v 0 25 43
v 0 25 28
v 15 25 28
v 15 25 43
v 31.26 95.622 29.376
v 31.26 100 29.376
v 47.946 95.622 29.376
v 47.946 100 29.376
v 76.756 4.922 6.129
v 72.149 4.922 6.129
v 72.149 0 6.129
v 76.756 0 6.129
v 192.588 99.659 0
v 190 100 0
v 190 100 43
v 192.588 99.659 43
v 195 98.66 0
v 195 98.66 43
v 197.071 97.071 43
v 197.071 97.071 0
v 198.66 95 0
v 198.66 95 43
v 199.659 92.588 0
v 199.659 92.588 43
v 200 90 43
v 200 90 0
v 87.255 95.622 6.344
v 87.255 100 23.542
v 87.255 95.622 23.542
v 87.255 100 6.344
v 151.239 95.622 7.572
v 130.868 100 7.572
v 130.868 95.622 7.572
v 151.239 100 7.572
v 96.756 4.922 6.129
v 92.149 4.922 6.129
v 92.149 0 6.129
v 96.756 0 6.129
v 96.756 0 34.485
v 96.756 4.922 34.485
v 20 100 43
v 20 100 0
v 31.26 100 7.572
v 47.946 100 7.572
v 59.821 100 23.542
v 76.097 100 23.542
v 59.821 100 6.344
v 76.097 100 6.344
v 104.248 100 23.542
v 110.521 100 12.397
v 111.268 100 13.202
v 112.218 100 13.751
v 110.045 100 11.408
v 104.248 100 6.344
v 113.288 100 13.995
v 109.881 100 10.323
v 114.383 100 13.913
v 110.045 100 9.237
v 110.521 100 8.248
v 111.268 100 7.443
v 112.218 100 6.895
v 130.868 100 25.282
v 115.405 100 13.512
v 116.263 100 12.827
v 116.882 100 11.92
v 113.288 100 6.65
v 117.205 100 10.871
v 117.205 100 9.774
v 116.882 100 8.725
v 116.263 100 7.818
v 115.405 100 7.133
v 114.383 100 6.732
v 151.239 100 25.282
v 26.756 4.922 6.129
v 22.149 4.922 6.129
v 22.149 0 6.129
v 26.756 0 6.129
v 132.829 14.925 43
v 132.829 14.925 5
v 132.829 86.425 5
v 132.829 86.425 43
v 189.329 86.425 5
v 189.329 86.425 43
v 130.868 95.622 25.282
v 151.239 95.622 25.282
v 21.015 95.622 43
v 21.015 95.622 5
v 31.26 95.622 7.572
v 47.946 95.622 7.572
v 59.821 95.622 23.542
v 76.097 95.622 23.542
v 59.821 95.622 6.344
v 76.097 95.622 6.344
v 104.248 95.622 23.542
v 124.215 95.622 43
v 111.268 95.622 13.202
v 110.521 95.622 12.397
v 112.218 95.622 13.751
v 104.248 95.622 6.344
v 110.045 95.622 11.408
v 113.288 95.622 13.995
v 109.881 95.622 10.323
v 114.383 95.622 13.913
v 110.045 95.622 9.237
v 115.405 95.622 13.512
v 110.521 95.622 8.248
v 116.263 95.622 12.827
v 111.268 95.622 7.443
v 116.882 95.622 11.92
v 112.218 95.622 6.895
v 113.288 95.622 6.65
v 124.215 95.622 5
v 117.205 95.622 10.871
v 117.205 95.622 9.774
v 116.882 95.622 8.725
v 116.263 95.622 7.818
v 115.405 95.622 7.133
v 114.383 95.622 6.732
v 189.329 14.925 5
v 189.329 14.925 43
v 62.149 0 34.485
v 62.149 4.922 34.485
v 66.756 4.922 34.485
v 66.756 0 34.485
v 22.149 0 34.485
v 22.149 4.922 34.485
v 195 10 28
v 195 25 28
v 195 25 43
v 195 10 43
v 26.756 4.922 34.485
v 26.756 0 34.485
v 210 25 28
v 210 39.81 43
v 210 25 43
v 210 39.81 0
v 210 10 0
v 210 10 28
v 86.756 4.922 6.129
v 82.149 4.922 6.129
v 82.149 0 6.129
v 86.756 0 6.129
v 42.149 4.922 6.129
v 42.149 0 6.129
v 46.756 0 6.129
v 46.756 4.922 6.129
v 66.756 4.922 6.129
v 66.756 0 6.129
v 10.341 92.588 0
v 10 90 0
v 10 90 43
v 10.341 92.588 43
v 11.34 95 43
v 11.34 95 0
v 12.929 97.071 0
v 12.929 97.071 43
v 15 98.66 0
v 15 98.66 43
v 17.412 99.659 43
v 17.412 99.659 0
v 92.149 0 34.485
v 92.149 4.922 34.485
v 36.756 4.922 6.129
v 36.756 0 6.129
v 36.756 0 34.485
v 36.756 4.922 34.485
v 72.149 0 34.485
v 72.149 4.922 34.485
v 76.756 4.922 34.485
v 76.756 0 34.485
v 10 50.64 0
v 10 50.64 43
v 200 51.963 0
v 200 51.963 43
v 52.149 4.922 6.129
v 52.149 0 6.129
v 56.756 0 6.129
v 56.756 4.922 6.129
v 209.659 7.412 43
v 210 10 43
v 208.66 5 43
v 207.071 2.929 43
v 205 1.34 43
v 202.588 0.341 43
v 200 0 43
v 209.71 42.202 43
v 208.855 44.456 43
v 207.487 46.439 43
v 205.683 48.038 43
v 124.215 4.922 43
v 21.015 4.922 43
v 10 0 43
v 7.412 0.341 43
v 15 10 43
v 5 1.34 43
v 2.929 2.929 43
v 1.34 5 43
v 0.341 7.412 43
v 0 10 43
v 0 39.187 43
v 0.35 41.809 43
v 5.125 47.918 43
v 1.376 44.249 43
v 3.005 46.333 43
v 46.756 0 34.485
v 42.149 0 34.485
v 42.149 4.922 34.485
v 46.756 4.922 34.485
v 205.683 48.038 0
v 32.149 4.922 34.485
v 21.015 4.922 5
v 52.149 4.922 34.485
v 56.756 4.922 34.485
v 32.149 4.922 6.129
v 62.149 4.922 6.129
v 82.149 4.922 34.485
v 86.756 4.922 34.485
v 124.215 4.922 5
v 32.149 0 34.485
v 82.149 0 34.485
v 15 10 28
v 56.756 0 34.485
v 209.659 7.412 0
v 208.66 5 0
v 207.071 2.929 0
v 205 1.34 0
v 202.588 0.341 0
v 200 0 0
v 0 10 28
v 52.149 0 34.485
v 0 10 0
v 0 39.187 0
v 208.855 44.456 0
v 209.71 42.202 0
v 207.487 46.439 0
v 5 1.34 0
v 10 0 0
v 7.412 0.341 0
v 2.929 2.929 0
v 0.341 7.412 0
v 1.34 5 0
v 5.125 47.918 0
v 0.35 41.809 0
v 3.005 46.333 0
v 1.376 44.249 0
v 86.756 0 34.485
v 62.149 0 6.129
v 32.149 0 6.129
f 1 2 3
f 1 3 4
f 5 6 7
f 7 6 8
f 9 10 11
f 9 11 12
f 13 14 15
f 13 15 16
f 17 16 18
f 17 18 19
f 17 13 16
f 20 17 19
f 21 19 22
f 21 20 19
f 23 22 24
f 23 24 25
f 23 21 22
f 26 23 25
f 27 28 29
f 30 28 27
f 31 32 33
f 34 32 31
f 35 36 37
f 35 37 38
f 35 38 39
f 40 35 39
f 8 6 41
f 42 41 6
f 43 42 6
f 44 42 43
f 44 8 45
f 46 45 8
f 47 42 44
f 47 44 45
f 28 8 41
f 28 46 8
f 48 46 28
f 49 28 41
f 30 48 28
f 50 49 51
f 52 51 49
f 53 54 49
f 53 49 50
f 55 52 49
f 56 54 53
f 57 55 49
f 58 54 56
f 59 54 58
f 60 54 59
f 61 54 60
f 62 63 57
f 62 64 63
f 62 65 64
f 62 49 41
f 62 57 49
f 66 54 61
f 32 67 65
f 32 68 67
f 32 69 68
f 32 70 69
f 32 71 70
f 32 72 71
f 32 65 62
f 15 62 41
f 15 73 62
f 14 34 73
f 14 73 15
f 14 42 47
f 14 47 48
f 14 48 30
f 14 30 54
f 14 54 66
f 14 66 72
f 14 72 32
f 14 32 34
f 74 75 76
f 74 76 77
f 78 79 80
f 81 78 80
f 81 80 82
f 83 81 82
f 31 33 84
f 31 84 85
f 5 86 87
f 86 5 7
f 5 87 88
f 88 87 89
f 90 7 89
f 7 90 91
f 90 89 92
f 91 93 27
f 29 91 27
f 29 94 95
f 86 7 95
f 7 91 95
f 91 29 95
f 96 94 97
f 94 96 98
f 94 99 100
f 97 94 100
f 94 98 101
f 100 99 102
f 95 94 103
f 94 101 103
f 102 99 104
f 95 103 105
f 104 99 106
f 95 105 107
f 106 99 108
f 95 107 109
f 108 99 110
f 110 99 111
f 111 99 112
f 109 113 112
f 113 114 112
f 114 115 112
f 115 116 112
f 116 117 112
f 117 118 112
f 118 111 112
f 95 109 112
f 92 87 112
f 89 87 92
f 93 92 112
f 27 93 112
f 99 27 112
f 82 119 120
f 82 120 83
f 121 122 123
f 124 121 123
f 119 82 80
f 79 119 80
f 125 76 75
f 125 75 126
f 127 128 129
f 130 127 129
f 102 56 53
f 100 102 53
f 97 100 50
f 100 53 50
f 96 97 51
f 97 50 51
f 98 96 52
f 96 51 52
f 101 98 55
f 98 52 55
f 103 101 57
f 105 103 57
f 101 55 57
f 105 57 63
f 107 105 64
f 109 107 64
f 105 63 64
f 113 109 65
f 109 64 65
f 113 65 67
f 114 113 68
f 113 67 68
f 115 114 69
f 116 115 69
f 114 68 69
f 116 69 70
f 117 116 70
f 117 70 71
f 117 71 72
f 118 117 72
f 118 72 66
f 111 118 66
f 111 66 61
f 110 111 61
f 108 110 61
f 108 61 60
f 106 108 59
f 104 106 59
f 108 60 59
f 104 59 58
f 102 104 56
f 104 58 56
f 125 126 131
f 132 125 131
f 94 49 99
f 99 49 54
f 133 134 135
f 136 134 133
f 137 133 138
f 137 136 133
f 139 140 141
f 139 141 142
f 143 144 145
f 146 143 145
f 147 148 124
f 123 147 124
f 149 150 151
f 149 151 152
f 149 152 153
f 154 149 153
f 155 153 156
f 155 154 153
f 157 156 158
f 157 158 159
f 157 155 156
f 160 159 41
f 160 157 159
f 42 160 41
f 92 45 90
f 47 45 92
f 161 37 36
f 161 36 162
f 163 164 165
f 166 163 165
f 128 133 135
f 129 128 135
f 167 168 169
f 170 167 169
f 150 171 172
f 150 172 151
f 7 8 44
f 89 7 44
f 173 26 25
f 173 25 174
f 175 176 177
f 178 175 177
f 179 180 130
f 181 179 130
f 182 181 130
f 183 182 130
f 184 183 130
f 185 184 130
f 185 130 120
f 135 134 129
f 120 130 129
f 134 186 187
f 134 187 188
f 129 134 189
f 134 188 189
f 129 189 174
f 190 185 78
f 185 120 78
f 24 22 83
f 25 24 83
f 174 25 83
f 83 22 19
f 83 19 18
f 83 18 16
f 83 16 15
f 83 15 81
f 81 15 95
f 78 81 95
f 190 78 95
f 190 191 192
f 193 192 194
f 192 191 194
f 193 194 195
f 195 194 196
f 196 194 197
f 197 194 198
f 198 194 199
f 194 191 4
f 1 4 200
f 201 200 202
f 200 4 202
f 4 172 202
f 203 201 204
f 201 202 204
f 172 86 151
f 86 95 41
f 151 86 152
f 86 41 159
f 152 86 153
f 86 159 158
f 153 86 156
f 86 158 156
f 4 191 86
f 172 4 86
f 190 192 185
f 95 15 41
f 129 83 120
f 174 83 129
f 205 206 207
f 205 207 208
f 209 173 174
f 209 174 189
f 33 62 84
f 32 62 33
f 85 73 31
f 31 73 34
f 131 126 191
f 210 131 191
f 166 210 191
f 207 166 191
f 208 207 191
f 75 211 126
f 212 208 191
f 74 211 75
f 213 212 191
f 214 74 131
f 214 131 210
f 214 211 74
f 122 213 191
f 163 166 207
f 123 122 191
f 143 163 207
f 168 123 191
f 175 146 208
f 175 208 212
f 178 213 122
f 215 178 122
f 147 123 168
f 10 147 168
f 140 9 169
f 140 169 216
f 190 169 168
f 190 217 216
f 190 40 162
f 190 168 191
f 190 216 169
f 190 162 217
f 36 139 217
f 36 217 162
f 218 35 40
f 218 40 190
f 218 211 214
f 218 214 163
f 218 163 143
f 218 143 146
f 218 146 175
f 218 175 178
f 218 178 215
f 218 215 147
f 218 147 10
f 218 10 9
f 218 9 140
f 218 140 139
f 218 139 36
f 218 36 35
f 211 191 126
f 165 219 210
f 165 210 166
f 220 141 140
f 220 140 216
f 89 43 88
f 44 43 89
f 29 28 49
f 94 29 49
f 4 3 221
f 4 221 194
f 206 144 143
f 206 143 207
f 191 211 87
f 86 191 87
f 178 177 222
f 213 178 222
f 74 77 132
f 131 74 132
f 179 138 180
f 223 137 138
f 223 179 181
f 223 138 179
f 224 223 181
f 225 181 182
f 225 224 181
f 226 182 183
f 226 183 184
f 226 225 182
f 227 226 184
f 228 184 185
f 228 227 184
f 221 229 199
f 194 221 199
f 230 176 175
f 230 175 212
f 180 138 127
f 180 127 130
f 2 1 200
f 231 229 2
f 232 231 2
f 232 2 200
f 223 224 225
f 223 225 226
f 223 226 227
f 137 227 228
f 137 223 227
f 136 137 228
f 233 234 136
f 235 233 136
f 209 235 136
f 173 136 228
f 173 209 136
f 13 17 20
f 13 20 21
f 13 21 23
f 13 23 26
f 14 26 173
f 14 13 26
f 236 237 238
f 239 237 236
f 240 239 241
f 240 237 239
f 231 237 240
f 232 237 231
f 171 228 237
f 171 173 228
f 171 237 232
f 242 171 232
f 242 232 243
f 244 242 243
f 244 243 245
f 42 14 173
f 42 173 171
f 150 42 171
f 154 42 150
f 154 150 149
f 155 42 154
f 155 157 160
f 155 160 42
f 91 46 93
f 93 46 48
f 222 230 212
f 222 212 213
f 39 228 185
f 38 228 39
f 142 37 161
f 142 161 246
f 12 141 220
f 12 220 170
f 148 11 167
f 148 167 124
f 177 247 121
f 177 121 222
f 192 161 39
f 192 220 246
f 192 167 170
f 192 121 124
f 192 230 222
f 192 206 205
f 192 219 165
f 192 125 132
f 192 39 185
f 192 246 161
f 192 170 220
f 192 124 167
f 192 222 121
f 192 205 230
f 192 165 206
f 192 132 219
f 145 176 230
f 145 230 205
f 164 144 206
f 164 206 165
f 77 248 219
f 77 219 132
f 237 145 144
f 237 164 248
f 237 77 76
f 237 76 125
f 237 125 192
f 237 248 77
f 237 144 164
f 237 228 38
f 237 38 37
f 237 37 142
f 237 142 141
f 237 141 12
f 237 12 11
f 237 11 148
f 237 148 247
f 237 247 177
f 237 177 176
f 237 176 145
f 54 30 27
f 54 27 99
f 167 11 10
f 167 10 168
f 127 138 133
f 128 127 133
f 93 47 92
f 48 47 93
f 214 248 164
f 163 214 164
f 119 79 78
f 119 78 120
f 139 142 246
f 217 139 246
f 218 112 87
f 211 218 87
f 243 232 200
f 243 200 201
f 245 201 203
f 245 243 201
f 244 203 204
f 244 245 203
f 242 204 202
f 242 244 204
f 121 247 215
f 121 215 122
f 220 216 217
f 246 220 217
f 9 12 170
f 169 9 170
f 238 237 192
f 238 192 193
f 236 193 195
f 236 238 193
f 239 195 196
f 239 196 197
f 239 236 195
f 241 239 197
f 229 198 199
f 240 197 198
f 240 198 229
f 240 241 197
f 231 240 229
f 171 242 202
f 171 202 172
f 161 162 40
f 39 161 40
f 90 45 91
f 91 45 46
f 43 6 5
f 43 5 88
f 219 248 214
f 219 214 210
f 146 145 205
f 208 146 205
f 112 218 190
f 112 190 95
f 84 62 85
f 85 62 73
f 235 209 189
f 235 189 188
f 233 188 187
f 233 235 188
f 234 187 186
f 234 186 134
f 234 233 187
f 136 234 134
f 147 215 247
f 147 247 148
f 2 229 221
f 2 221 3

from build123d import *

# Parameters (mm, degrees)
SKETCH_1_W          = 103.2
SKETCH_1_H          = 90.7
SKETCH_1_W_2        = 56.5
SKETCH_1_H_2        = 71.5
EXTRUDE_1_DEPTH     = 43
EXTRUDE_3_DEPTH     = 5
SKETCH_4_R          = 3.682623049
SKETCH_4_W          = 20.371137154
SKETCH_4_H          = 17.709581546
SKETCH_4_W_2        = 16.685906313
SKETCH_4_H_2        = 21.804282482
SKETCH_4_W_3        = 16.276436219
SKETCH_4_H_3        = 17.19774393
SKETCH_4_W_4        = 16.993008883
CUT_EXTRUDE_2_DEPTH = 4.377522815
SKETCH_5_W          = 4.606538552
SKETCH_5_H          = 28.355803979
CUT_EXTRUDE_3_DEPTH = 4.922477185
SKETCH_8_W          = 15
SKETCH_8_H          = 15
CUT_EXTRUDE_5_DEPTH = 15


with BuildPart() as part:
    # 草图1 → 凸台-拉伸1 (new body)
    with BuildSketch(Plane.XY):
        with BuildLine():
            Line((0, 10), (0, 39.186569494))
            ThreePointArc((0, 39.186569494), (1.375838219, 44.248568464), (5.124766715, 47.917669105))
            Line((5.124766715, 47.917669105), (10, 50.639880584))
            Line((10, 50.639880584), (10, 90))
            ThreePointArc((10, 90), (12.928932188, 97.071067812), (20, 100))
            Line((20, 100), (190, 100))
            ThreePointArc((190, 100), (197.071067812, 97.071067812), (200, 90))
            Line((200, 90), (200, 51.963395008))
            Line((200, 51.963395008), (205.683304945, 48.037782396))
            ThreePointArc((205.683304945, 48.037782396), (208.855310538, 44.455580593), (210, 39.809778695))
            Line((210, 39.809778695), (210, 10))
            ThreePointArc((210, 10), (207.071067812, 2.928932188), (200, 0))
            Line((200, 0), (10, 0))
            ThreePointArc((10, 0), (2.928932188, 2.928932188), (0, 10))
        make_face()
        with Locations((72.614593403, 50.272477185)):
            Rectangle(SKETCH_1_W, SKETCH_1_H, mode=Mode.SUBTRACT)
        with Locations((161.079111209, 50.675353005)):
            Rectangle(SKETCH_1_W_2, SKETCH_1_H_2, mode=Mode.SUBTRACT)
    extrude(amount=EXTRUDE_1_DEPTH)

    # 草图3 → 凸台-拉伸3 (add)
    with BuildSketch(Plane.XY):
        with BuildLine():
            Line((0, 10), (0, 39.186569494))
            ThreePointArc((0, 39.186569494), (1.375838219, 44.248568464), (5.124766715, 47.917669105))
            Line((5.124766715, 47.917669105), (10, 50.639880584))
            Line((10, 50.639880584), (10, 90))
            ThreePointArc((10, 90), (12.928932188, 97.071067812), (20, 100))
            Line((20, 100), (180, 100))
            ThreePointArc((180, 100), (187.071067812, 97.071067812), (190, 90))
            Line((190, 90), (190, 51.963395008))
            Line((190, 51.963395008), (195.683304945, 48.037782396))
            ThreePointArc((195.683304945, 48.037782396), (198.855310538, 44.455580593), (200, 39.809778695))
            Line((200, 39.809778695), (200, 10))
            ThreePointArc((200, 10), (197.071067812, 2.928932188), (190, 0))
            Line((190, 0), (10, 0))
            ThreePointArc((10, 0), (2.928932188, 2.928932188), (0, 10))
        make_face()
    extrude(amount=EXTRUDE_3_DEPTH)

    # 草图4 → 切除-拉伸2 (cut)
    with BuildSketch(Plane(origin=(0, 100, 0), x_dir=(1, 0, 0), z_dir=(0, 1, 0))):
        with Locations(Location((113.563696849, -10.32262821, 0), (0, 0, 180))):
            Circle(SKETCH_4_R)
        with Locations((141.053854619, -16.426982565)):
            Rectangle(SKETCH_4_W, SKETCH_4_H)
        with Locations((39.603161201, -18.474333033)):
            Rectangle(SKETCH_4_W_2, SKETCH_4_H_2)
        with Locations((67.958965179, -14.942653476)):
            Rectangle(SKETCH_4_W_3, SKETCH_4_H_3)
        with Locations((95.751747779, -14.942653476)):
            Rectangle(SKETCH_4_W_4, SKETCH_4_H_3)
    extrude(amount=-CUT_EXTRUDE_2_DEPTH, mode=Mode.SUBTRACT)

    # 草图5 → 切除-拉伸3 (cut)
    with BuildSketch(Plane.XZ):
        with Locations((34.452767739, 20.30710257)):
            Rectangle(SKETCH_5_W, SKETCH_5_H)
        with Locations((24.452767739, 20.30710257)):
            Rectangle(SKETCH_5_W, SKETCH_5_H)
        with Locations((44.452767739, 20.30710257)):
            Rectangle(SKETCH_5_W, SKETCH_5_H)
        with Locations((54.452767739, 20.30710257)):
            Rectangle(SKETCH_5_W, SKETCH_5_H)
        with Locations((64.452767739, 20.30710257)):
            Rectangle(SKETCH_5_W, SKETCH_5_H)
        with Locations((74.452767739, 20.30710257)):
            Rectangle(SKETCH_5_W, SKETCH_5_H)
        with Locations((84.452767739, 20.30710257)):
            Rectangle(SKETCH_5_W, SKETCH_5_H)
        with Locations((94.452767739, 20.30710257)):
            Rectangle(SKETCH_5_W, SKETCH_5_H)
    extrude(amount=-CUT_EXTRUDE_3_DEPTH, mode=Mode.SUBTRACT)

    # 草图8 → 切除-拉伸5 (cut)
    with BuildSketch(Plane.ZY):
        with Locations((35.5, 17.5)):
            Rectangle(SKETCH_8_W, SKETCH_8_H)
    cut_extrude_5 = extrude(amount=-CUT_EXTRUDE_5_DEPTH, mode=Mode.SUBTRACT)

    # 镜向1: 切除-拉伸5 across plane
    add(cut_extrude_5.mirror(Plane.ZY.offset(-105)), mode=Mode.SUBTRACT)


solid = part.part
